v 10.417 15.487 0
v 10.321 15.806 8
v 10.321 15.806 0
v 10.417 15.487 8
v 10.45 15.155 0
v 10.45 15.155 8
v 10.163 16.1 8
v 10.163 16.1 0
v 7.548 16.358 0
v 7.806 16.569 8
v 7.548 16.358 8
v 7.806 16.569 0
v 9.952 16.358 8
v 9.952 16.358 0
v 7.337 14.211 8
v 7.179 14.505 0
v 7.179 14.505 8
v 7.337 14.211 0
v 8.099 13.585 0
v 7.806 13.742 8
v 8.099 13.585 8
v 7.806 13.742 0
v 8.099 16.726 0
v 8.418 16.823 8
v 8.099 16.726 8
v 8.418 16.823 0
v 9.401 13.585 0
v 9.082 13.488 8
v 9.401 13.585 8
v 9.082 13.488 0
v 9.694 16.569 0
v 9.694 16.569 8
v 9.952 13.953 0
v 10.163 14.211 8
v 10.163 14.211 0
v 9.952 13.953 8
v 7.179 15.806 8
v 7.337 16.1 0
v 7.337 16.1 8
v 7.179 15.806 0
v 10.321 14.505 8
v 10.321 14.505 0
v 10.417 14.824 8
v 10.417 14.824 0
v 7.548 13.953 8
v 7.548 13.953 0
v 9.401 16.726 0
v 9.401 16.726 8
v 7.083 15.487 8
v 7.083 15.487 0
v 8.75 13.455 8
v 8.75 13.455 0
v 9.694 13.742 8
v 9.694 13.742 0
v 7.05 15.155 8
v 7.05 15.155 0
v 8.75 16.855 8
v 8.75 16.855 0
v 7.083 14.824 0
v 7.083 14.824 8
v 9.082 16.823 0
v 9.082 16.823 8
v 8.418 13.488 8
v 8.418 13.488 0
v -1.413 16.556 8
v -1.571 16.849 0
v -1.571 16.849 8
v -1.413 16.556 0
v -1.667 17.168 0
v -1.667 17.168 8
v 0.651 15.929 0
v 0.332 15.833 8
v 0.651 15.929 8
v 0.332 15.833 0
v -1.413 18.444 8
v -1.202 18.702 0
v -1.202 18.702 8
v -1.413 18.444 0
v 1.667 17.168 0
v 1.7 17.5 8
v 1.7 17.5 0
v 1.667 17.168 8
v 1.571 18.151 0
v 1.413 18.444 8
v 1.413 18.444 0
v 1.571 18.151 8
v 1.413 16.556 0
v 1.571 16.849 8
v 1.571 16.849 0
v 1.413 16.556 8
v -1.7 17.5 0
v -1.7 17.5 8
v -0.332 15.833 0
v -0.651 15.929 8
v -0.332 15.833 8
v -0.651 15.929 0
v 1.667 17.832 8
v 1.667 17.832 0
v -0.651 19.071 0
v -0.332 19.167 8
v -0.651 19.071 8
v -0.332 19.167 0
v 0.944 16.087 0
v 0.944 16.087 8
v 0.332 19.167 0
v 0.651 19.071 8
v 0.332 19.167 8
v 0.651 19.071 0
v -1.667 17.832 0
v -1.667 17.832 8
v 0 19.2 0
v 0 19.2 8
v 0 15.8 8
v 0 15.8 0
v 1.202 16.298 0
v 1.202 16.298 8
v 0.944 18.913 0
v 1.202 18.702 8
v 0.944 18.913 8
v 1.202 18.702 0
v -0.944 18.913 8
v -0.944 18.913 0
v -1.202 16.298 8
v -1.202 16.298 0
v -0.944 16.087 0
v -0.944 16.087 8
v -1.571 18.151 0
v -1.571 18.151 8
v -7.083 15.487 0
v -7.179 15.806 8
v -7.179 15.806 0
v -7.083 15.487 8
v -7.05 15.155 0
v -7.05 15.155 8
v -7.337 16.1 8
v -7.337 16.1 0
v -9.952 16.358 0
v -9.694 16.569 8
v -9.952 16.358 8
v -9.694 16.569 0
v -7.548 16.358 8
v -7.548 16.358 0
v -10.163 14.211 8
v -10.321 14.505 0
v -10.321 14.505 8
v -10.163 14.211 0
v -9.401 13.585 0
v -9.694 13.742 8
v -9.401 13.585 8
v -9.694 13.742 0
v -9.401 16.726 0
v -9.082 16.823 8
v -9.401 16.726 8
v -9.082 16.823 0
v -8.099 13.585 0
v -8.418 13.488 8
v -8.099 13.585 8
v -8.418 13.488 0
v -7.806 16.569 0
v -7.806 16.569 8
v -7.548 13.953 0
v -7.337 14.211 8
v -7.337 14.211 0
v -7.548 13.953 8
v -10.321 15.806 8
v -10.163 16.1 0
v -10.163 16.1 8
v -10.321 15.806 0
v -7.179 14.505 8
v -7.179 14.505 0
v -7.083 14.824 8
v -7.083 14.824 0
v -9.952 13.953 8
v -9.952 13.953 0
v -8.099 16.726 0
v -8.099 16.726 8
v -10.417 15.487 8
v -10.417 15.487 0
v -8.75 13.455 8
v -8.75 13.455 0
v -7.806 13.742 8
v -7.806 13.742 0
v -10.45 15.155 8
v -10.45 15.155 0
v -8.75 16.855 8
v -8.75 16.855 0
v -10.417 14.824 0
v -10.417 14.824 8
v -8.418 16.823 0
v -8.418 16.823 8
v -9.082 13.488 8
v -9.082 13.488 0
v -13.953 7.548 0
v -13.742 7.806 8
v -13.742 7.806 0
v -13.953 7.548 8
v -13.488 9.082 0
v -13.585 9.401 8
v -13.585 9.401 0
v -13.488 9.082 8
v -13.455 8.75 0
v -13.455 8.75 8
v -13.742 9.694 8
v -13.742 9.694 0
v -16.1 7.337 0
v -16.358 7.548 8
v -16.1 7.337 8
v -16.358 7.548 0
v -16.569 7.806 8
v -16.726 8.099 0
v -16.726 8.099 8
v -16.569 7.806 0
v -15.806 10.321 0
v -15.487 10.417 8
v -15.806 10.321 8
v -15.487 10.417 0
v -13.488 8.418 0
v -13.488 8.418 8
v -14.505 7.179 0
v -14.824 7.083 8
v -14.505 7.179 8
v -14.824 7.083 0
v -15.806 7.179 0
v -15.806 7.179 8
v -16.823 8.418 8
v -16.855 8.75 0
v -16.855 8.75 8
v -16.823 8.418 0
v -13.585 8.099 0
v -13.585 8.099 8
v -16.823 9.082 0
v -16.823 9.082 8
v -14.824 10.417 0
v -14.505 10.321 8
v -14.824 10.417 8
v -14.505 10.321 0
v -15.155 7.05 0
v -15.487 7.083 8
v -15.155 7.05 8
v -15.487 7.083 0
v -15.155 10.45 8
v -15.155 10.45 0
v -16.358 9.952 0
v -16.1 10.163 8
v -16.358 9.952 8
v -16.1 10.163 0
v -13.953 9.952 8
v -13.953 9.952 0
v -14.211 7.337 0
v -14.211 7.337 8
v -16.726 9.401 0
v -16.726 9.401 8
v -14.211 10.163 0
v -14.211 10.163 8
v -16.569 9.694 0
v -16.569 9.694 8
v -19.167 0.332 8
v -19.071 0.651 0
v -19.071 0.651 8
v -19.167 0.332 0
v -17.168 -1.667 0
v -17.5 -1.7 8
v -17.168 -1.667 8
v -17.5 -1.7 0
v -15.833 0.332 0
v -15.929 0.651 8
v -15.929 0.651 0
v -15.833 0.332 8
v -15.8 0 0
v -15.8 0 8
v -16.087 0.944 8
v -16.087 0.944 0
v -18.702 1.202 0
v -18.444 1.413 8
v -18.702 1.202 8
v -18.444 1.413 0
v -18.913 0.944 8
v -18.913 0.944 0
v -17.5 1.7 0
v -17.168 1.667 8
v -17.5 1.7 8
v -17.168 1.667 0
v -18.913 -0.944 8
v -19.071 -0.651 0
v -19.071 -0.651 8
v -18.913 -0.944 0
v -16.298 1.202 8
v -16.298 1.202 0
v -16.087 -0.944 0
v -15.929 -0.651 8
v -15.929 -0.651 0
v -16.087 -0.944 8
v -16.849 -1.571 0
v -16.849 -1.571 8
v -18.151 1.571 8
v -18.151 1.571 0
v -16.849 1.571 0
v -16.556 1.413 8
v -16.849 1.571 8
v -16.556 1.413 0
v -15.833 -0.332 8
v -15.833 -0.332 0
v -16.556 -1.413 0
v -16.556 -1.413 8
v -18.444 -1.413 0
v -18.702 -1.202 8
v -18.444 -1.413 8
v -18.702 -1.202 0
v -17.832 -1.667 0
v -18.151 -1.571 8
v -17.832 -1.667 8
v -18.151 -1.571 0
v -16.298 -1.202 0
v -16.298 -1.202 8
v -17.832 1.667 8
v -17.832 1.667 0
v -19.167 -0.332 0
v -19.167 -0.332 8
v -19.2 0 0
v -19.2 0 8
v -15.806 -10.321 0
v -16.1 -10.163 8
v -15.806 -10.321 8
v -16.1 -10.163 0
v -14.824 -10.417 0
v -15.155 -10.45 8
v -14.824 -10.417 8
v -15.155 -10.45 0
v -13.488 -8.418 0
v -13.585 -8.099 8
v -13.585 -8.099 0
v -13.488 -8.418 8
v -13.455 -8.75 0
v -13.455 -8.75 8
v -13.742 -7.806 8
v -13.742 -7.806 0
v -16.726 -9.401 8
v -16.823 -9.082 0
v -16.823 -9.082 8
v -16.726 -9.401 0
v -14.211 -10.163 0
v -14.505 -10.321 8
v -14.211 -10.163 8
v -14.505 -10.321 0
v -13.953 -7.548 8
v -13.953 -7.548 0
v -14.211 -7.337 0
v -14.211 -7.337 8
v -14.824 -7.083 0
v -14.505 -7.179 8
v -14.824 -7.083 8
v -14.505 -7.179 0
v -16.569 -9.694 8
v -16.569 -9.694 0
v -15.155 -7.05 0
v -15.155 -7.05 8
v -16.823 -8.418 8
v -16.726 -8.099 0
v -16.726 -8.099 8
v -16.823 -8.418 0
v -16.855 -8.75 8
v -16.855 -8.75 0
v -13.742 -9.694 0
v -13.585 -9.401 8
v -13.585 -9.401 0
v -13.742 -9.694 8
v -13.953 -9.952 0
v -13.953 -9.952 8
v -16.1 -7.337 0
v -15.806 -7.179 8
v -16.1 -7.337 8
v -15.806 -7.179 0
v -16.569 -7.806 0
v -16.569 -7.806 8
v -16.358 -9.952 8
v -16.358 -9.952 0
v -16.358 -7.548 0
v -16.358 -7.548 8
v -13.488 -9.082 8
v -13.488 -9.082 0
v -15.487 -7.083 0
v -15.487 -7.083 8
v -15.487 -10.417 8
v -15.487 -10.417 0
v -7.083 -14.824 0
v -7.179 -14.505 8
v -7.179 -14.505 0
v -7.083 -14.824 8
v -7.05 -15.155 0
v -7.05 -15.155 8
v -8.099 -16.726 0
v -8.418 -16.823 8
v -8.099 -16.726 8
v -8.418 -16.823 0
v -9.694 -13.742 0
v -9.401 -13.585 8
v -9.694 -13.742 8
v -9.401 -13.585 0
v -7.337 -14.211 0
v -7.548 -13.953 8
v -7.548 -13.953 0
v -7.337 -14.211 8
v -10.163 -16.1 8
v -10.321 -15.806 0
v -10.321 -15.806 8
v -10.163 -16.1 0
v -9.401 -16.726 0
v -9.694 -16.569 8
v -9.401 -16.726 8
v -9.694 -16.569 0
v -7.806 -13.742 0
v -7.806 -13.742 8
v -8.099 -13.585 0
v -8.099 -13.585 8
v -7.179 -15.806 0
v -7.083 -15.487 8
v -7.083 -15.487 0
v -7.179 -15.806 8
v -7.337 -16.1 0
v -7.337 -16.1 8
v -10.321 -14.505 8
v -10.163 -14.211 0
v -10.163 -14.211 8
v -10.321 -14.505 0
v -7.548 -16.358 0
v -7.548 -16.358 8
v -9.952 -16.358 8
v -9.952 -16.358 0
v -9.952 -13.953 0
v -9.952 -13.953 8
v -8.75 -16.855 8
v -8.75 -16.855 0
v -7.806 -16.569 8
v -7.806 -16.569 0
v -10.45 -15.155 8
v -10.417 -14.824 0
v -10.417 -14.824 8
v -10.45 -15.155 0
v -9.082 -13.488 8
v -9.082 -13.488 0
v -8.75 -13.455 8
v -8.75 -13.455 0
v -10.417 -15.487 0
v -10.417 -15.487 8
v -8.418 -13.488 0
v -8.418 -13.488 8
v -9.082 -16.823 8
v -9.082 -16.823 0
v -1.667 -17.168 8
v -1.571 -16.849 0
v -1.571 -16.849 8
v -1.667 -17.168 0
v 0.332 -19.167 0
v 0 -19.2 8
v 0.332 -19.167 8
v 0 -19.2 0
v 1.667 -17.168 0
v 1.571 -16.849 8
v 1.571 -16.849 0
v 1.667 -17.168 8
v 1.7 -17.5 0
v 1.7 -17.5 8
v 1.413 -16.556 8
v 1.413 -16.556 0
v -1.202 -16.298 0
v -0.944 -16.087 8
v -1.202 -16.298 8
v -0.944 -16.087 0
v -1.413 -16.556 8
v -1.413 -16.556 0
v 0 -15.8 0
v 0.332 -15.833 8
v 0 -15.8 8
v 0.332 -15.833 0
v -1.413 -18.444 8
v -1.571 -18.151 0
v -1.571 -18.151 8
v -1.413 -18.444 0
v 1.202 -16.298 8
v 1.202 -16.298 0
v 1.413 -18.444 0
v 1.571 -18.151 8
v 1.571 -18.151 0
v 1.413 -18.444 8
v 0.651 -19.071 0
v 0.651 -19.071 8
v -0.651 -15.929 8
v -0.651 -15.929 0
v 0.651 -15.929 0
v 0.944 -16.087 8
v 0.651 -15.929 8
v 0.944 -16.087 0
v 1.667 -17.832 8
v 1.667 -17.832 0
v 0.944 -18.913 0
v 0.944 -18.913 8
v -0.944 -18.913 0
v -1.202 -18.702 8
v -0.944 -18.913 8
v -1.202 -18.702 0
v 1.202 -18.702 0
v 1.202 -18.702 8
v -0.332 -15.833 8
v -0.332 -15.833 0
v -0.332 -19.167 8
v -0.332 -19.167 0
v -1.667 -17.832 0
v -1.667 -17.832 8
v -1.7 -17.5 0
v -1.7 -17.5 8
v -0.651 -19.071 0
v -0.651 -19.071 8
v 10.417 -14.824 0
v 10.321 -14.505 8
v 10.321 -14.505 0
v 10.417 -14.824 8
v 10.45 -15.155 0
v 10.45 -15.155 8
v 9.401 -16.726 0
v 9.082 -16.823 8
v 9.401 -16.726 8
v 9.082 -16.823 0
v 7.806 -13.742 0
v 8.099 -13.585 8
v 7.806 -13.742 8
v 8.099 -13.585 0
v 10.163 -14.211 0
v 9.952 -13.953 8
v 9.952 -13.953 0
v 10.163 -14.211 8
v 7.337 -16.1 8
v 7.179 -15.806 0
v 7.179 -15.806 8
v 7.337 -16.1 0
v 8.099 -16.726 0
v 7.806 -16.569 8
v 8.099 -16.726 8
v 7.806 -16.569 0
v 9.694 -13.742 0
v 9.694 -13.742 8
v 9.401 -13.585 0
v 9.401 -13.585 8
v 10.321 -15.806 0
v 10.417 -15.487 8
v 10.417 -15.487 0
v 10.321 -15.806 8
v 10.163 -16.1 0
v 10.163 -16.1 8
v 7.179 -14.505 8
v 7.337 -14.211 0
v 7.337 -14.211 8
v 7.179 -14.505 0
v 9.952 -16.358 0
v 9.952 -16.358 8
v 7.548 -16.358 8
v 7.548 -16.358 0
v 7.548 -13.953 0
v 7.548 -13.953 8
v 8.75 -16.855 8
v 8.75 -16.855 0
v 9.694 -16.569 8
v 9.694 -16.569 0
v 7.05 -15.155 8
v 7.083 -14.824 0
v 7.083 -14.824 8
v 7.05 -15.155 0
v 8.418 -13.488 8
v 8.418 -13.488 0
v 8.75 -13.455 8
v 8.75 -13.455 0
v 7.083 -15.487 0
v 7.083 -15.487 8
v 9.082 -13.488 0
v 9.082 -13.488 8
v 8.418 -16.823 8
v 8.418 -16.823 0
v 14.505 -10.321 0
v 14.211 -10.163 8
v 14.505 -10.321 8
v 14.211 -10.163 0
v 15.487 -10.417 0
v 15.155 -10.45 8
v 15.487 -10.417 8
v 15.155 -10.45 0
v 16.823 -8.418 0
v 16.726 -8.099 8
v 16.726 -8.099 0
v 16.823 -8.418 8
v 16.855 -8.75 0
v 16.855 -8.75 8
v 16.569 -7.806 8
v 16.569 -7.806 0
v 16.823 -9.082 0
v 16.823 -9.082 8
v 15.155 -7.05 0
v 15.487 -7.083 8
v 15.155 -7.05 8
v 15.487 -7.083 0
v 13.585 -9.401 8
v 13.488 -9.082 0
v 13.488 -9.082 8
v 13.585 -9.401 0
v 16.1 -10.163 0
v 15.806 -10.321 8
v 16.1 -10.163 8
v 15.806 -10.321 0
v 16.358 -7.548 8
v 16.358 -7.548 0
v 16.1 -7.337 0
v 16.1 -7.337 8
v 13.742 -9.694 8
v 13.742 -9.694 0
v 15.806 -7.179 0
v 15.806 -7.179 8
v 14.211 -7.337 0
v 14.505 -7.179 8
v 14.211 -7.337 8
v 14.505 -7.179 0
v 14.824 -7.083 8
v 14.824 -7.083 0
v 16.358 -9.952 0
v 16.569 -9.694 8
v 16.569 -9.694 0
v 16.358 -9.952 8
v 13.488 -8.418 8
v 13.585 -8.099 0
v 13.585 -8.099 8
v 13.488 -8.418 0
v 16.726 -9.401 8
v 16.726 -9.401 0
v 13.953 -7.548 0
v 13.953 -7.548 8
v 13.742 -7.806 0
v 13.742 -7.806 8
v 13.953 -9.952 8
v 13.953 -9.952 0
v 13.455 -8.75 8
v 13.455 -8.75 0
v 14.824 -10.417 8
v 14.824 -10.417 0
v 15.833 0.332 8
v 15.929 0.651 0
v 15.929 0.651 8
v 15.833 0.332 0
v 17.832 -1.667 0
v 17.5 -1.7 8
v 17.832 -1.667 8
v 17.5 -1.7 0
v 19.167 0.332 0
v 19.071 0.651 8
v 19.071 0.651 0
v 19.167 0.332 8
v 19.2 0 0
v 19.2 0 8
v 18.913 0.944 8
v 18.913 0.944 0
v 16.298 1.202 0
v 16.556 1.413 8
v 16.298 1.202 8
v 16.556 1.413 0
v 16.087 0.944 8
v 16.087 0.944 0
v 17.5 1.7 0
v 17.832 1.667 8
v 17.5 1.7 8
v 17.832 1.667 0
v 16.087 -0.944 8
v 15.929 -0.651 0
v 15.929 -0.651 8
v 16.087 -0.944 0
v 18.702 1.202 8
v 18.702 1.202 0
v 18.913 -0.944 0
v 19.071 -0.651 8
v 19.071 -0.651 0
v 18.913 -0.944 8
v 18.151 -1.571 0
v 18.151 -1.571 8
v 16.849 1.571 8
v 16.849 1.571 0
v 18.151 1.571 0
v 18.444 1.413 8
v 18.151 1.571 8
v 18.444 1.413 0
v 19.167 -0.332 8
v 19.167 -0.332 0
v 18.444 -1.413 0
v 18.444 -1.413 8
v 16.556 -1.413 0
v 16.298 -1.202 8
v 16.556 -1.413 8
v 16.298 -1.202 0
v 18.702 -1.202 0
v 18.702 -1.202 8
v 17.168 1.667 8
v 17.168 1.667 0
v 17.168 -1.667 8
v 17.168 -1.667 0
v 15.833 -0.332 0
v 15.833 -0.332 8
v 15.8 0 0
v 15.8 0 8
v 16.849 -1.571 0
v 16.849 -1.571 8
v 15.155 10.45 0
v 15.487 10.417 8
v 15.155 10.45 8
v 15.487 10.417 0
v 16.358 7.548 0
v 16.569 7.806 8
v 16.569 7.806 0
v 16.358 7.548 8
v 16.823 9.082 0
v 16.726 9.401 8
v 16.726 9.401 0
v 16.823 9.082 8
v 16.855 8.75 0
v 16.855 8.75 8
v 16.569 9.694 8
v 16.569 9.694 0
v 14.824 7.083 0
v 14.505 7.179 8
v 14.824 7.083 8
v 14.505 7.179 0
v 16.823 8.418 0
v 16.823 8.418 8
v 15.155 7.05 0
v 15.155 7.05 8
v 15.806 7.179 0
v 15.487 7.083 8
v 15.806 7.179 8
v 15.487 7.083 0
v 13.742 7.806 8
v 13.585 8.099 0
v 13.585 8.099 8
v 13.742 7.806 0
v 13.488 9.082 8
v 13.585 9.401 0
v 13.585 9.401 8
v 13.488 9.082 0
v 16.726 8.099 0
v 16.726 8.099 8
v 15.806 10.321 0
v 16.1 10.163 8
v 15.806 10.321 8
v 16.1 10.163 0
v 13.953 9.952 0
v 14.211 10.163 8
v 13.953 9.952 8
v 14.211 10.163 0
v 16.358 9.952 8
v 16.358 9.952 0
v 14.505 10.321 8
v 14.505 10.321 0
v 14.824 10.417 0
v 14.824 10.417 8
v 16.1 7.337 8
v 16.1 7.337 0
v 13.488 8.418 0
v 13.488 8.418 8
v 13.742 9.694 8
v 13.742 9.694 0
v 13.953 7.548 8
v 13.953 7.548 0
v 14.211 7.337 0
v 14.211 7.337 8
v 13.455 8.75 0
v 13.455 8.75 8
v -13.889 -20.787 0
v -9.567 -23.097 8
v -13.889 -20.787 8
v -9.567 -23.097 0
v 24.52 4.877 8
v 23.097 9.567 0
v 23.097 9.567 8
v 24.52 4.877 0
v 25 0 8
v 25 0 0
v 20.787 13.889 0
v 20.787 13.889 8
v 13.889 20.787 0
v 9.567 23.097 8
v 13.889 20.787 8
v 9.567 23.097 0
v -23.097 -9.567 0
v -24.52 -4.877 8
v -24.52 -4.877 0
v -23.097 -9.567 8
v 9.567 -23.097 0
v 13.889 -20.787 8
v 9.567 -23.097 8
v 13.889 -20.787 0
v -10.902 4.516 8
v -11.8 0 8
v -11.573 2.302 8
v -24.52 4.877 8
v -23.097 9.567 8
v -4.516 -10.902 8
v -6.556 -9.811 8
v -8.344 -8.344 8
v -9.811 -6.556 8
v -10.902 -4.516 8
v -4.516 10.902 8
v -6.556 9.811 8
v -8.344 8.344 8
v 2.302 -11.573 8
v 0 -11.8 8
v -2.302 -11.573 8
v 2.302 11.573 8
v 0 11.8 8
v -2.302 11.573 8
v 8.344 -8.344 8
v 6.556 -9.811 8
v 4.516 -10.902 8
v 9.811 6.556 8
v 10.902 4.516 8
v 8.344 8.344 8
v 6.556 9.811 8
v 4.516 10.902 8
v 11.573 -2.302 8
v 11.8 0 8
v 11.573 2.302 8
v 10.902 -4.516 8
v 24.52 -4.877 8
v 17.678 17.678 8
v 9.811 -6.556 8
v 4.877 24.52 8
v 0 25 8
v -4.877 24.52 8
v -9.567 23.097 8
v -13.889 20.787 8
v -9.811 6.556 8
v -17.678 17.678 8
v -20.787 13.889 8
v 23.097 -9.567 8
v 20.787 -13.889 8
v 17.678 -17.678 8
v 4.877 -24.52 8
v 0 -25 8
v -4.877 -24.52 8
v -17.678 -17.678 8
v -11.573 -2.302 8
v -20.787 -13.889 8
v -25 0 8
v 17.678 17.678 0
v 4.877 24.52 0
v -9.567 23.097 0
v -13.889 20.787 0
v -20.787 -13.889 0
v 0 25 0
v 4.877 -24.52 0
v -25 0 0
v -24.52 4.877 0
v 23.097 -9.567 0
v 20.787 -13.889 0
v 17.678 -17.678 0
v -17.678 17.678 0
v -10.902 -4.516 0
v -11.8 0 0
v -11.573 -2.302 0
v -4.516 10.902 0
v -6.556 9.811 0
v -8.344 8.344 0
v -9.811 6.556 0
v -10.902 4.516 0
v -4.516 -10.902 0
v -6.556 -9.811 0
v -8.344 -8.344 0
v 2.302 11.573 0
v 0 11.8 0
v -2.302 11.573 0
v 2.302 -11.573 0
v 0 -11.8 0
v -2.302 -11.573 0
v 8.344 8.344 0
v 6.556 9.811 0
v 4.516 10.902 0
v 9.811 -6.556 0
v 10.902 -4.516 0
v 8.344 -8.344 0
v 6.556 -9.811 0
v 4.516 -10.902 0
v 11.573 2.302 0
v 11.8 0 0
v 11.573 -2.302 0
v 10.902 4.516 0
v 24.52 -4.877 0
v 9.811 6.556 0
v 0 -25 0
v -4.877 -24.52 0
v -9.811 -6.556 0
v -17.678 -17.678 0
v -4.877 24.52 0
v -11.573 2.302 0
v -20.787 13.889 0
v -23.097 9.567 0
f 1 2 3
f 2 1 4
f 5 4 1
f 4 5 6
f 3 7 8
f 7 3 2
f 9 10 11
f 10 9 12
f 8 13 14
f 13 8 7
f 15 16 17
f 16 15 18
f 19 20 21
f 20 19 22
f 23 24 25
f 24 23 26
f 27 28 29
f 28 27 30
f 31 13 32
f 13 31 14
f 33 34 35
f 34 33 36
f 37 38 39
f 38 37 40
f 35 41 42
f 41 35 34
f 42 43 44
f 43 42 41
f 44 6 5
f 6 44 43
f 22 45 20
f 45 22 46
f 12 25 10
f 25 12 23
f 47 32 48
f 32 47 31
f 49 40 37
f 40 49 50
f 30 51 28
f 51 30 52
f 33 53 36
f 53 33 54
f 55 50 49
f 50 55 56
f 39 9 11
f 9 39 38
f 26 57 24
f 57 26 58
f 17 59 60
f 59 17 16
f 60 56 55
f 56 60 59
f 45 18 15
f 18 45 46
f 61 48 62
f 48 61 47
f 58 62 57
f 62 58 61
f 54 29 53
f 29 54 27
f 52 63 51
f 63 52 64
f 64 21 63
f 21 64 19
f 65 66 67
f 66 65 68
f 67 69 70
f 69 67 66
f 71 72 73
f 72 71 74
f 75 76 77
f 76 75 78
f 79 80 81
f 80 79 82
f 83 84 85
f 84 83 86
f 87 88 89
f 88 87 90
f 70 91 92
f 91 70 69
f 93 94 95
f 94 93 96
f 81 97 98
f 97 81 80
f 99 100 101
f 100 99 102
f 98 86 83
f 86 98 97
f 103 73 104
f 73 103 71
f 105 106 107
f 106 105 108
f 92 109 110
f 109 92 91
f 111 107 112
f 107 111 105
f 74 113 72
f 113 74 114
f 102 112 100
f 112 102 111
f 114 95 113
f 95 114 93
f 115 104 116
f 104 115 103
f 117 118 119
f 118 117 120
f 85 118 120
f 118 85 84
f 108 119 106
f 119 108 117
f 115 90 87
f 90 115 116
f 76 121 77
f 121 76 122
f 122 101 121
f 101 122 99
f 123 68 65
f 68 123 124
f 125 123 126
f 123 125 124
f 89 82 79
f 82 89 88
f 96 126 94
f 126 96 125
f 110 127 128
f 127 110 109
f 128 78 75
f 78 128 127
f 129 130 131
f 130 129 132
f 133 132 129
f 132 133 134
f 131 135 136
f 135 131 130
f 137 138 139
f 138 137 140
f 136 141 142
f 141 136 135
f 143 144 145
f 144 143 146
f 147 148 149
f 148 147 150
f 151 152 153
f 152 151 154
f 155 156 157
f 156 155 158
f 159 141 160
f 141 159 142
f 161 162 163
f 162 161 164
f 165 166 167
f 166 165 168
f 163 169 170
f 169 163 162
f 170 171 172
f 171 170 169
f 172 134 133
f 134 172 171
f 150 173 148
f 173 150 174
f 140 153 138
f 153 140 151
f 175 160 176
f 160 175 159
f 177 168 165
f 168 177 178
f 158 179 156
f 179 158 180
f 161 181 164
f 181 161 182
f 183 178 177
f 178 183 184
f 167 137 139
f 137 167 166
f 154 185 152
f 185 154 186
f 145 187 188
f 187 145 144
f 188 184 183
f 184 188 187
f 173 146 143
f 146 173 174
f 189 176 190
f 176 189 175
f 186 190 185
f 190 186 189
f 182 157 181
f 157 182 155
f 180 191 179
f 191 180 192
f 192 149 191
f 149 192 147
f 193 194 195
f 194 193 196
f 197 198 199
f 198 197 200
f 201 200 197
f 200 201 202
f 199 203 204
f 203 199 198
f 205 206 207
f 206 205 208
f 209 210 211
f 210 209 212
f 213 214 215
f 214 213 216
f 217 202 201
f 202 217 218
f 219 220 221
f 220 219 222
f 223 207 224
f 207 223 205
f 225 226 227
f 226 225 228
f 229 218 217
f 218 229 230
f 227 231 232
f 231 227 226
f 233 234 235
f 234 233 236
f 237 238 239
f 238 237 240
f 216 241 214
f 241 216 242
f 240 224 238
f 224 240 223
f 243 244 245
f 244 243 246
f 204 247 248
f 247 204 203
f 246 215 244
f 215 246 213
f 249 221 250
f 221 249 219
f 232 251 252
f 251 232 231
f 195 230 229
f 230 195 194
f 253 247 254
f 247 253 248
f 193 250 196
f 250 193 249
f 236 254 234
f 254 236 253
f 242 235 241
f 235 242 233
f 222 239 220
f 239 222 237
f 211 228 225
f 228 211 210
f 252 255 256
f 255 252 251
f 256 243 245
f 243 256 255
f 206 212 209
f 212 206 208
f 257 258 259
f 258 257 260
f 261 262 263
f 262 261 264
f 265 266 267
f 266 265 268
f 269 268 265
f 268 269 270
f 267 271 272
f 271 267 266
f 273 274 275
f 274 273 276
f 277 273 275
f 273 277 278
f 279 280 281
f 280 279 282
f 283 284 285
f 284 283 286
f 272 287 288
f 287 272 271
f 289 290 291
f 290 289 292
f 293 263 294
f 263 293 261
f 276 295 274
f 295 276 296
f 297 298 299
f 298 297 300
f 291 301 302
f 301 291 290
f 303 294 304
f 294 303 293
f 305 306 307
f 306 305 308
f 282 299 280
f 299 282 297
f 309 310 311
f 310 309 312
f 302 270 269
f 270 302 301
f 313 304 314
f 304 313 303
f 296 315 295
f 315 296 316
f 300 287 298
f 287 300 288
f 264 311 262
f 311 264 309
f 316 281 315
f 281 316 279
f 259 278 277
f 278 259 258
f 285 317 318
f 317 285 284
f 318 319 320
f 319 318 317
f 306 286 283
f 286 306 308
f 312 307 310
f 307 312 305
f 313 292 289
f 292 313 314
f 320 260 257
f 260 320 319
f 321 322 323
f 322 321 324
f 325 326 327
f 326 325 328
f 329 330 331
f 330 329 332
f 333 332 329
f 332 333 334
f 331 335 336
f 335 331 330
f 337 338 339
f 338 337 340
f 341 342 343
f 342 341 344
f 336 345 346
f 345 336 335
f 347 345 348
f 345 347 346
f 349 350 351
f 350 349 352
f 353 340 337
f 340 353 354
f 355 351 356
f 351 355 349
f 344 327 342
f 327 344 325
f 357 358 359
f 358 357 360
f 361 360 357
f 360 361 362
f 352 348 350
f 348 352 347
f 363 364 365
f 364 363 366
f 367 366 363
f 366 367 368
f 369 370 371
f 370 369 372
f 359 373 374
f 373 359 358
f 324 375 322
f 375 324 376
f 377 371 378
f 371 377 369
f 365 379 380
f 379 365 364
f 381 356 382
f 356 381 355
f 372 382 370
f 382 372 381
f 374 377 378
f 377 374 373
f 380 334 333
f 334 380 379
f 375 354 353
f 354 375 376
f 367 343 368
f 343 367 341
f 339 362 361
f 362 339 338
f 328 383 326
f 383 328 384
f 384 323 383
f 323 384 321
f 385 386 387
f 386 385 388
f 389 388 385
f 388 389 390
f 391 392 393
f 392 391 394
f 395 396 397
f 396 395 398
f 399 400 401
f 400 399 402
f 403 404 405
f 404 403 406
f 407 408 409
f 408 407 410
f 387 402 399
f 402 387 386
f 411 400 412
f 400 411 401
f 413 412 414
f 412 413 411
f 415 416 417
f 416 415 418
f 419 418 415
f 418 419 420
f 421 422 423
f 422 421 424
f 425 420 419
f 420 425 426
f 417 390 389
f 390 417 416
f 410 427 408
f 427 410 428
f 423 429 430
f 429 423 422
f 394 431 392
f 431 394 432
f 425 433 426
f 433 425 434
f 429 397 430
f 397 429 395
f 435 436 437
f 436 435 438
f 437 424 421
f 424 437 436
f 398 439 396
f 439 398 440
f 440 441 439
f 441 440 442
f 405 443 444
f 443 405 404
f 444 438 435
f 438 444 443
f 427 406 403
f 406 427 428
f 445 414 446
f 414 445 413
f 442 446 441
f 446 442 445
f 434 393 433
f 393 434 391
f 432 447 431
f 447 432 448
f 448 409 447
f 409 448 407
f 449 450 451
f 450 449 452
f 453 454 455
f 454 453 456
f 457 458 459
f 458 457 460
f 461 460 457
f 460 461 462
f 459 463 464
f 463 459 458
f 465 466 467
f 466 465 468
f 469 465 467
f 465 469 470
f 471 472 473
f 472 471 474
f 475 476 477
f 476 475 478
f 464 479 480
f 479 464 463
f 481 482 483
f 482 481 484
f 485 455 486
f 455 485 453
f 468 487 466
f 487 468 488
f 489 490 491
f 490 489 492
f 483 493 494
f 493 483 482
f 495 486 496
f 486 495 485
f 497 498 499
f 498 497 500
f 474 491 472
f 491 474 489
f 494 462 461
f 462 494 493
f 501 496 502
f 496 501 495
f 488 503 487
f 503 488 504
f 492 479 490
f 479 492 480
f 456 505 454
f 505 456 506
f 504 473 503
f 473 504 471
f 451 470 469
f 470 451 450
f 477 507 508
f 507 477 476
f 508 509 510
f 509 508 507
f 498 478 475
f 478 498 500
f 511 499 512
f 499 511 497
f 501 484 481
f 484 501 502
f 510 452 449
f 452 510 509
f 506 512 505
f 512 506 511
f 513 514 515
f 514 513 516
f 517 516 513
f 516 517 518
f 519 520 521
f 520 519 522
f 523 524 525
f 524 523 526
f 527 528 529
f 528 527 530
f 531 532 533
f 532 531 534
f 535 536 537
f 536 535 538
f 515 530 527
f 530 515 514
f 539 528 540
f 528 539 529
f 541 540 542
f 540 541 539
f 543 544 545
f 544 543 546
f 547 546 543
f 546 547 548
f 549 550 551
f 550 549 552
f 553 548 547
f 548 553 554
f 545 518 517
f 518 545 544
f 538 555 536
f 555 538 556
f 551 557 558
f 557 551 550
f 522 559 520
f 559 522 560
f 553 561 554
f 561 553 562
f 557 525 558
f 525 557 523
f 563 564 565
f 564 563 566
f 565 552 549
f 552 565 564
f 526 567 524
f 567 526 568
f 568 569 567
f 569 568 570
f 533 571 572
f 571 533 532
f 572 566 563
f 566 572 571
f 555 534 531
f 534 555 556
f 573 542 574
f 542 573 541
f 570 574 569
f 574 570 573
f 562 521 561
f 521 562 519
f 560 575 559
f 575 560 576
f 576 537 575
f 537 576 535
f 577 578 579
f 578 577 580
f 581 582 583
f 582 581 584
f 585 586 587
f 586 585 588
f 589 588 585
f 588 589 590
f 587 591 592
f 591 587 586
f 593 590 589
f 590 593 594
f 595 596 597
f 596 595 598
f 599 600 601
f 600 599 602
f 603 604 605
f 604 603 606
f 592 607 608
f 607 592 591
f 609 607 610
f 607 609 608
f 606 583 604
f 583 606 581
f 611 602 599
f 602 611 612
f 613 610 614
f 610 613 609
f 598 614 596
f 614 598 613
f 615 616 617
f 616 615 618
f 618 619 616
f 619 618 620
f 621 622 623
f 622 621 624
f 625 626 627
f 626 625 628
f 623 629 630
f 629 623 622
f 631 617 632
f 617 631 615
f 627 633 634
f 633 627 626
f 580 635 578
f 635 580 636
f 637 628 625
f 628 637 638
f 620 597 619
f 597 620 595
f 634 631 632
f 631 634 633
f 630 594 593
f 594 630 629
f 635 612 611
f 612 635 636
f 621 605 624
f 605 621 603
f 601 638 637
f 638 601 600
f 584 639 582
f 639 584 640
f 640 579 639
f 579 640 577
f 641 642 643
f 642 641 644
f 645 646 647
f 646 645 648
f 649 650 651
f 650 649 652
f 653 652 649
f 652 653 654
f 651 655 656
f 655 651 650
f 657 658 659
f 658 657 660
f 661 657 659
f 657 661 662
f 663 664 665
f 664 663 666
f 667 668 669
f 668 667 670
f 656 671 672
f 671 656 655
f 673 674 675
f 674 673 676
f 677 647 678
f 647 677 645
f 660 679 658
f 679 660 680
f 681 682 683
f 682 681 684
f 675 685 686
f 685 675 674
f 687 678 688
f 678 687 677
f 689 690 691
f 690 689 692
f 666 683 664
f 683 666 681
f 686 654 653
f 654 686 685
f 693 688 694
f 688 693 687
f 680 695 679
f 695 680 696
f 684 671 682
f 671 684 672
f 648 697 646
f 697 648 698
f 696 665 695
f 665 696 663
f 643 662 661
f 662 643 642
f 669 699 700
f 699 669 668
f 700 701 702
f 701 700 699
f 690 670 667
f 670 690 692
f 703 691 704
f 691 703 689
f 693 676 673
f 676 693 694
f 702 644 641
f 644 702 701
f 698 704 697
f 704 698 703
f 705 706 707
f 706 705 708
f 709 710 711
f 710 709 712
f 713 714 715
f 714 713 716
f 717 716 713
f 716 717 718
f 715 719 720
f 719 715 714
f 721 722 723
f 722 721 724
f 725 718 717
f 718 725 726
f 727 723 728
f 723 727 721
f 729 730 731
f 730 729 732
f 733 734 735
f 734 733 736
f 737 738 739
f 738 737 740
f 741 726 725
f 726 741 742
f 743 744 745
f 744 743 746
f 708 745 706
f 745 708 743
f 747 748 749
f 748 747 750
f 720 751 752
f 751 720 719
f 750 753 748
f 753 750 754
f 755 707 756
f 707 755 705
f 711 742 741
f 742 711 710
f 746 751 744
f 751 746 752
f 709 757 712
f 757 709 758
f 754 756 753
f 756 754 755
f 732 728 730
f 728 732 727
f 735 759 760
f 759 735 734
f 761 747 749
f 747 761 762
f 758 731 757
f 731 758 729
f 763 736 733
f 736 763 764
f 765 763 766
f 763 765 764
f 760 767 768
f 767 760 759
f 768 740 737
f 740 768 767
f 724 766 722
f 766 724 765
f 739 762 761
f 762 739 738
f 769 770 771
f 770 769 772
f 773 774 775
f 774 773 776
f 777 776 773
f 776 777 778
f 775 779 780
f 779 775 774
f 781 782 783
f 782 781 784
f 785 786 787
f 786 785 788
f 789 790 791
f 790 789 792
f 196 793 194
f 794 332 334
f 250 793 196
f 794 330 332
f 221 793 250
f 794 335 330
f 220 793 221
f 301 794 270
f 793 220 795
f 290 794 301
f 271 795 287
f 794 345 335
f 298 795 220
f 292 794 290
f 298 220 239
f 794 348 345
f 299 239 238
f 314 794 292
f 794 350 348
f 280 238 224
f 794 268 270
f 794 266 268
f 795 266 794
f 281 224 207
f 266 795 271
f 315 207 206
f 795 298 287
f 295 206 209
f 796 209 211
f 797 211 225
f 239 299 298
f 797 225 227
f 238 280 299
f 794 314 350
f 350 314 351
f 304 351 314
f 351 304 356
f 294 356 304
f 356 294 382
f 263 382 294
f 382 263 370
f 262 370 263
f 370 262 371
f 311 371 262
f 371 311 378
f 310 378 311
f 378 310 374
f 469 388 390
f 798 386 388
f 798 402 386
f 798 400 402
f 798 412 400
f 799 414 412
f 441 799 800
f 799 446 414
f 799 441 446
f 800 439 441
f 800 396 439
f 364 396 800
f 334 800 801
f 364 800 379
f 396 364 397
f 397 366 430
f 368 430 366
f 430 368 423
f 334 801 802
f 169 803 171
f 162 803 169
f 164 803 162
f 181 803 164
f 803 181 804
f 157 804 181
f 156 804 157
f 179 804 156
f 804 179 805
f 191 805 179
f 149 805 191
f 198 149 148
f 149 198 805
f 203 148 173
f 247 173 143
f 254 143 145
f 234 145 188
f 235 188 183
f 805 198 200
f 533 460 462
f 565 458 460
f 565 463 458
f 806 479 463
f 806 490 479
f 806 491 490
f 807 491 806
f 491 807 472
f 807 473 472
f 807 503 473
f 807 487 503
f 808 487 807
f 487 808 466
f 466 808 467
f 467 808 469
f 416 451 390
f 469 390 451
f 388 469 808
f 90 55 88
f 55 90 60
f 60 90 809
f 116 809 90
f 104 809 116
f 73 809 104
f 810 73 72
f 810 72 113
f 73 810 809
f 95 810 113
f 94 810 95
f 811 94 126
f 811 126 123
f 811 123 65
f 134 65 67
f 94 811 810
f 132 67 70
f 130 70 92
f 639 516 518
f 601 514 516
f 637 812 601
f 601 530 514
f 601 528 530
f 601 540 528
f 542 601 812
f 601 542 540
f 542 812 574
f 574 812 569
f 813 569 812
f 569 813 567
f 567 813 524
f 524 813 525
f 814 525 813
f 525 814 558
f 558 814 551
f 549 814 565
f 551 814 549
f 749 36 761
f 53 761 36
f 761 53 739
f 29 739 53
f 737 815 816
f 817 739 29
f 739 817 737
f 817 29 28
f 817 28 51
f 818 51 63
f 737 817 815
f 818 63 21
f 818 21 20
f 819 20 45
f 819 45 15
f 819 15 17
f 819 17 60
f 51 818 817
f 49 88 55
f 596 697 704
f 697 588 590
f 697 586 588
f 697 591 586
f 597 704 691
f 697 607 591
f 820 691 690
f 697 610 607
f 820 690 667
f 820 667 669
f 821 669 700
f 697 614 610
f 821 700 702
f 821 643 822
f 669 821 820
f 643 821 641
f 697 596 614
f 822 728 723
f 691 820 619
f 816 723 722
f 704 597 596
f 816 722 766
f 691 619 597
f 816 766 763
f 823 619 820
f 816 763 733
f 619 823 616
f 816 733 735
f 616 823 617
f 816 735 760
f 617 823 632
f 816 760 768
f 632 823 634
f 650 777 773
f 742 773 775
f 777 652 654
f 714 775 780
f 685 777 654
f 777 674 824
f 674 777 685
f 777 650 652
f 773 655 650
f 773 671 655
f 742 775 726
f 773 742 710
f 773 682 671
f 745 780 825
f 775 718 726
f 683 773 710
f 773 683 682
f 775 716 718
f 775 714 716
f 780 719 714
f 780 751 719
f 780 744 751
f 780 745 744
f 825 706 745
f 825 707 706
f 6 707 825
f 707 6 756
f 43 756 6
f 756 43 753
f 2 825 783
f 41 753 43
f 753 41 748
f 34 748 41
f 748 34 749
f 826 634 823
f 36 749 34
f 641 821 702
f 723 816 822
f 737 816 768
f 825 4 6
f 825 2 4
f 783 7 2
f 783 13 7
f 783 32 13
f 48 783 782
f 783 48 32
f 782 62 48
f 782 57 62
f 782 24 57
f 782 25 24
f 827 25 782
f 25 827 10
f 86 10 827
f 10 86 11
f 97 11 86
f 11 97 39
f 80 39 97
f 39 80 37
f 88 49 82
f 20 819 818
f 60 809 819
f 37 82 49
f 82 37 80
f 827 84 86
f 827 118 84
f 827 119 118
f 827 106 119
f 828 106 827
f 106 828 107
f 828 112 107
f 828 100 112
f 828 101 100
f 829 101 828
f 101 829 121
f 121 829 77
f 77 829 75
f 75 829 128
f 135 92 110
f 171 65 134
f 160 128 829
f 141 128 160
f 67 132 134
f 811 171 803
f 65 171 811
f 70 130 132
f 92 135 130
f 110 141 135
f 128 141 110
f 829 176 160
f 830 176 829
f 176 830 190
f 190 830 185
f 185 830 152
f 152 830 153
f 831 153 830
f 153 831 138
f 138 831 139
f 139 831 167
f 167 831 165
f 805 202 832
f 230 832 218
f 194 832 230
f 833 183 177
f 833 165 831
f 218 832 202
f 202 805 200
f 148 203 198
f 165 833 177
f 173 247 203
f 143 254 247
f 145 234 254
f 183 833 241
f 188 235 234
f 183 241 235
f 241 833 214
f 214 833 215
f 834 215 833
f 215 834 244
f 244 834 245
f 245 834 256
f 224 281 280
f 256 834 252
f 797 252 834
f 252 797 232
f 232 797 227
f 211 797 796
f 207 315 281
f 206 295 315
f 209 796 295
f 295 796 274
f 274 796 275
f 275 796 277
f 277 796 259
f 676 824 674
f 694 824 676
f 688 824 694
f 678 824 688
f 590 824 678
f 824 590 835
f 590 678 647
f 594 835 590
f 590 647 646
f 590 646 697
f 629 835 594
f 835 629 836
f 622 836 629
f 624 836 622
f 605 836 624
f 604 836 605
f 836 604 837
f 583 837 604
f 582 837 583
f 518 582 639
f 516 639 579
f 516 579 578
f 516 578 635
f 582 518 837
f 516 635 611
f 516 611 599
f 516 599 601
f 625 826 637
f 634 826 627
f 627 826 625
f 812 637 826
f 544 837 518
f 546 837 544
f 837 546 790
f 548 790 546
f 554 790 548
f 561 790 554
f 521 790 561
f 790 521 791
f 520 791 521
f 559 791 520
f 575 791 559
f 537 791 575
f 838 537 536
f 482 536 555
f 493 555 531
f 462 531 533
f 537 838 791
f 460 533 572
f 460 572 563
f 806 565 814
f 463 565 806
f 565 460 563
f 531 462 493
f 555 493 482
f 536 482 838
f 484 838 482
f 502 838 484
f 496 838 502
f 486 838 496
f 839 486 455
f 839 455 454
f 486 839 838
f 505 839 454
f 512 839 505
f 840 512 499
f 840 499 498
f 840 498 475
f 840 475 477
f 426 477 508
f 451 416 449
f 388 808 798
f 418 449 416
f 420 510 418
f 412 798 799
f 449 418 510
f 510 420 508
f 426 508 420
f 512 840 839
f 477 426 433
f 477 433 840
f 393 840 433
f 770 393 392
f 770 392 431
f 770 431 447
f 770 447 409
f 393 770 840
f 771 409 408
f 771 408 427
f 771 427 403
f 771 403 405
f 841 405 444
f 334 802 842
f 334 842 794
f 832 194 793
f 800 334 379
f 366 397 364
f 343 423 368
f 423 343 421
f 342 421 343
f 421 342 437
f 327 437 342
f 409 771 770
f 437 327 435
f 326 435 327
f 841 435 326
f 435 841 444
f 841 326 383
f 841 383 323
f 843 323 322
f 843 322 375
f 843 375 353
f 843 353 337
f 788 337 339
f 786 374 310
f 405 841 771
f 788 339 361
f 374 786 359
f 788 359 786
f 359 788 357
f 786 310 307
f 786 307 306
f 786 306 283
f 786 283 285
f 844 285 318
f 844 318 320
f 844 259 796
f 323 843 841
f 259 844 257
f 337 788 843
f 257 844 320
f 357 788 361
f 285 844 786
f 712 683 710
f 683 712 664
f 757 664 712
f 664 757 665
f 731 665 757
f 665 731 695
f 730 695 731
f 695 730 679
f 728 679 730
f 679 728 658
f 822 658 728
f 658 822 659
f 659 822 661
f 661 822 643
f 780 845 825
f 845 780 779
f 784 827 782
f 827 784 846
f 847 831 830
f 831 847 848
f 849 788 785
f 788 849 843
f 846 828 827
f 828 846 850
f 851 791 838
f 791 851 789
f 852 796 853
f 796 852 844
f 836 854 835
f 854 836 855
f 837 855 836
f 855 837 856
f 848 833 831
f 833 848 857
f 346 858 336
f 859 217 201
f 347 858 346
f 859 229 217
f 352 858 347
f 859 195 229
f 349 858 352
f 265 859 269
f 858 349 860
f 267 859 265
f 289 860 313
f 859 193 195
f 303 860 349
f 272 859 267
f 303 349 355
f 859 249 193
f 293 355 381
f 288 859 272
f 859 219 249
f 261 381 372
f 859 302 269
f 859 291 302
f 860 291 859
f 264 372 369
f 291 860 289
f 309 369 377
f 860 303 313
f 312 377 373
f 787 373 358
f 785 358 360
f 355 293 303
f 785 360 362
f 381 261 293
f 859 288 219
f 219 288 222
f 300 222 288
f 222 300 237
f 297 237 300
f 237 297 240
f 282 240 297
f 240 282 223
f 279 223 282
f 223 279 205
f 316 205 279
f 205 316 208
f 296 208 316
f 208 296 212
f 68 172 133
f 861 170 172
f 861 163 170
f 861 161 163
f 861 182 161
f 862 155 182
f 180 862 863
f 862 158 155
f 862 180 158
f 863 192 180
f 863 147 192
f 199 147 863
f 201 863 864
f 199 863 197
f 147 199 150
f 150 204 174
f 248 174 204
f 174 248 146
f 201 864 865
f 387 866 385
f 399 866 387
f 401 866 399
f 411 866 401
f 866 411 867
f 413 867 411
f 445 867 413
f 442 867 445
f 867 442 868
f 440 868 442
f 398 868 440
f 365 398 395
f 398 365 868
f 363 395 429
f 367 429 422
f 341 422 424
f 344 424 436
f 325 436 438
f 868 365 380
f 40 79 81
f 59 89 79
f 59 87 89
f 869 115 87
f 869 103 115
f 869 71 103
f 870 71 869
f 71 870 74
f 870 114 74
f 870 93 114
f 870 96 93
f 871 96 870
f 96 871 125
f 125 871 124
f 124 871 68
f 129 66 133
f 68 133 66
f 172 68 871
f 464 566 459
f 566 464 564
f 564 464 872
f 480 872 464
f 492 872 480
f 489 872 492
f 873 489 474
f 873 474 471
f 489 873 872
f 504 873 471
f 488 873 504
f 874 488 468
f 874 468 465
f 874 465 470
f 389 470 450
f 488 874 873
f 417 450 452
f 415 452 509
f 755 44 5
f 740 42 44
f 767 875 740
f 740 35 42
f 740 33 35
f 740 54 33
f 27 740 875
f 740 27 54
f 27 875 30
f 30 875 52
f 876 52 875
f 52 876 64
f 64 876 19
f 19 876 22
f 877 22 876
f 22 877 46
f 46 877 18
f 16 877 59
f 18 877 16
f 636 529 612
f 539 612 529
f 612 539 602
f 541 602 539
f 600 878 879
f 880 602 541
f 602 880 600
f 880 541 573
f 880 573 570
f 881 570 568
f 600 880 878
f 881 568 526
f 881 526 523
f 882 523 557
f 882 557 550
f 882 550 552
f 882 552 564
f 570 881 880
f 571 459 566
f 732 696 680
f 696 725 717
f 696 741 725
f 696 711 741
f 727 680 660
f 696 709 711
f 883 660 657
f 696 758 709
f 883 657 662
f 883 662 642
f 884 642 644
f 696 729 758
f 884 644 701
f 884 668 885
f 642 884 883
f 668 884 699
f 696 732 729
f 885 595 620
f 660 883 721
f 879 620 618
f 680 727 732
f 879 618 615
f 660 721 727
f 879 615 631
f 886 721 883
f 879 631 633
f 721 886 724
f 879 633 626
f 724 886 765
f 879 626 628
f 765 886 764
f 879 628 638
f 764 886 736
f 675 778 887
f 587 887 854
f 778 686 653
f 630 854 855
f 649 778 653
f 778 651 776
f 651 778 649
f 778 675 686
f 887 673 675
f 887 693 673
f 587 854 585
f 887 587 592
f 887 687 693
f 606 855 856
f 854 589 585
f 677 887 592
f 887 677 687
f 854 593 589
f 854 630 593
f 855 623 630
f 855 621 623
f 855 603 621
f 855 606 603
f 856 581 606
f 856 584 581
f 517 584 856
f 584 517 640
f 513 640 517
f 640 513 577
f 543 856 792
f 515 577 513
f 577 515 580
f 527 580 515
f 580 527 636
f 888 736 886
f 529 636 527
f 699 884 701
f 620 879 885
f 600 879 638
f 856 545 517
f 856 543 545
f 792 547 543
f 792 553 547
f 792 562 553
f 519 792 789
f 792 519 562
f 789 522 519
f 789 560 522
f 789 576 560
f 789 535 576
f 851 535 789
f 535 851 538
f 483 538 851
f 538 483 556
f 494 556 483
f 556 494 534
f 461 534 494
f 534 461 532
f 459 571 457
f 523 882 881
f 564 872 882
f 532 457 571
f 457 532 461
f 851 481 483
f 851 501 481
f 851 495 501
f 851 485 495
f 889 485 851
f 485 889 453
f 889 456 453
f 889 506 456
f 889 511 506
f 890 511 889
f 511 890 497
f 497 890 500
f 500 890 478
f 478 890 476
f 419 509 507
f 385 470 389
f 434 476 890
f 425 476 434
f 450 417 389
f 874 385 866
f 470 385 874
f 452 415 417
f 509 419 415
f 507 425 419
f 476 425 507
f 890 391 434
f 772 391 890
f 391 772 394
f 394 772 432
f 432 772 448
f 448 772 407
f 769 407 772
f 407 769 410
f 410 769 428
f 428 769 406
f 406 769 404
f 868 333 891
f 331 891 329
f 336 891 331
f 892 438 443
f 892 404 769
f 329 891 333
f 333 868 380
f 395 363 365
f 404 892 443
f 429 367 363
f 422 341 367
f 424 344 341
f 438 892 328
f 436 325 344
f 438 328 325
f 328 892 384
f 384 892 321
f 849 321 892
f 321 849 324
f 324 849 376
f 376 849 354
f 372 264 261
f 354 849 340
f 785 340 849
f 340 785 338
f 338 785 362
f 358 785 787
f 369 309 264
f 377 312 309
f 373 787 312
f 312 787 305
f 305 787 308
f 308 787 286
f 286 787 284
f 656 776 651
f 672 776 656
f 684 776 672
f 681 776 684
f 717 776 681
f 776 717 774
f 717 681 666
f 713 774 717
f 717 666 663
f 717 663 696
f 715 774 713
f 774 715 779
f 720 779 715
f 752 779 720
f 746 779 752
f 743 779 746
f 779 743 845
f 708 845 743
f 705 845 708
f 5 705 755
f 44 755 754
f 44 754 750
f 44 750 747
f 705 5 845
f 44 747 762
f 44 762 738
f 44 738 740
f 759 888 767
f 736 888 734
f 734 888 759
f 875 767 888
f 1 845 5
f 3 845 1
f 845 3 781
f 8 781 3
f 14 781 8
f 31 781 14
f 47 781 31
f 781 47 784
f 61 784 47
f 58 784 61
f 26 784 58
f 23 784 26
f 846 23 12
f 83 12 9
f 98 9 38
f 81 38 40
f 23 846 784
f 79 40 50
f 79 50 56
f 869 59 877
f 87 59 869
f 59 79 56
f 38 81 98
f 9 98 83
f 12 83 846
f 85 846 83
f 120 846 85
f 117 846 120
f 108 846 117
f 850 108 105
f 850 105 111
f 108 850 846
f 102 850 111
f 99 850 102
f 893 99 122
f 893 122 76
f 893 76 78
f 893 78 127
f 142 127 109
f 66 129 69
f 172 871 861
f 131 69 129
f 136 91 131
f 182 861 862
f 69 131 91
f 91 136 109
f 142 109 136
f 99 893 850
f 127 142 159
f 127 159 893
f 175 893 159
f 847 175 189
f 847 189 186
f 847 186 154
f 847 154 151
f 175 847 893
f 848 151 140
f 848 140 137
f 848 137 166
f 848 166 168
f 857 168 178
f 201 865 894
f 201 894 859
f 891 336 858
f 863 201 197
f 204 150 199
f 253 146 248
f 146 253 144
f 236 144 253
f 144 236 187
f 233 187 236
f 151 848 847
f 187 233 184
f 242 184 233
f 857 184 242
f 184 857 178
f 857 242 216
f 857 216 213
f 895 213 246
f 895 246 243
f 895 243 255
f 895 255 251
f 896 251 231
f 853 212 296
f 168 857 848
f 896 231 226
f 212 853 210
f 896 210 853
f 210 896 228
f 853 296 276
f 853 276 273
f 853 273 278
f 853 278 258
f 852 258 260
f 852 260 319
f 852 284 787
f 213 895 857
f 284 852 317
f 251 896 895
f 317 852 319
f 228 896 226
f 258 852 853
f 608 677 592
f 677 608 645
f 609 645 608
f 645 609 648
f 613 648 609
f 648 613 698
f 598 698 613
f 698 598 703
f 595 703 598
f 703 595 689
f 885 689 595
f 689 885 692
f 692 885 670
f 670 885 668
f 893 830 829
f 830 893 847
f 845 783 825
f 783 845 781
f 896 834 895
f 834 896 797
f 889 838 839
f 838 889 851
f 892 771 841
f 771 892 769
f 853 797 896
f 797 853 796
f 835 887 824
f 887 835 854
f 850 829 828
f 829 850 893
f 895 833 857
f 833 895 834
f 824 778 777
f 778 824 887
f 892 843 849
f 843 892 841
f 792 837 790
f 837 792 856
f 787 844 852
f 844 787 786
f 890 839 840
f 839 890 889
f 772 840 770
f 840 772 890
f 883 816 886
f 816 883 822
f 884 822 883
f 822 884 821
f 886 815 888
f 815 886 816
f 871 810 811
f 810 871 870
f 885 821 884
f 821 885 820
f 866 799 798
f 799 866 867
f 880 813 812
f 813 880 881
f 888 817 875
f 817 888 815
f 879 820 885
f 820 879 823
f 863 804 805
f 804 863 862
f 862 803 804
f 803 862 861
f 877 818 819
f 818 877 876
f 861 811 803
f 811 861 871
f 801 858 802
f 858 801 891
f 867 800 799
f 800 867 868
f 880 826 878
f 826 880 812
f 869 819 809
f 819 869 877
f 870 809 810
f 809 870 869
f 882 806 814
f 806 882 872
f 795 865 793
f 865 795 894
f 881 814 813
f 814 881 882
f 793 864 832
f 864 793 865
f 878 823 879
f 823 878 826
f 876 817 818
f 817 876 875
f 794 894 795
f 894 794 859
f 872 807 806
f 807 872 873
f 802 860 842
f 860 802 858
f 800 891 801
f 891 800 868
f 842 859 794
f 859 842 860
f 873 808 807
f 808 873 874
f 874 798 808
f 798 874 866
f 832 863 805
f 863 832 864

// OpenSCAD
$fn = 32;

// ----------------------------------------------------------------------
// Flange Ø50 x 8
// 12 holes on a Ø35 bolt circle, bolted joints
// ----------------------------------------------------------------------

// --- parameters (mm) ---
flange_d = 50;   // outside diameter of the flange
thickness = 8;   // flange thickness
holes = 12;      // number of bolt holes
pcd = 35;        // bolt circle diameter
start_deg = 60;  // angle of the first hole, from +X
hole_d = 3.4;    // bolt hole diameter
bore_d = 23.6;   // central through bore
hub_d = 35.6;    // hub outside diameter
hub_h = 0;       // hub height above the flange face (0 = no hub)

// --- derived feature positions (mm) ---
height = thickness + hub_h;  // = 8   overall height of the part
pcd_r = pcd / 2;             // = 17.5   bolt circle radius
hole_step = 360 / holes;     // = 30   angular pitch
feature_centers = [
  [pcd_r * cos(start_deg + 0 * hole_step), pcd_r * sin(start_deg + 0 * hole_step)],
  [pcd_r * cos(start_deg + 1 * hole_step), pcd_r * sin(start_deg + 1 * hole_step)],
  [pcd_r * cos(start_deg + 2 * hole_step), pcd_r * sin(start_deg + 2 * hole_step)],
  [pcd_r * cos(start_deg + 3 * hole_step), pcd_r * sin(start_deg + 3 * hole_step)],
  [pcd_r * cos(start_deg + 4 * hole_step), pcd_r * sin(start_deg + 4 * hole_step)],
  [pcd_r * cos(start_deg + 5 * hole_step), pcd_r * sin(start_deg + 5 * hole_step)],
  [pcd_r * cos(start_deg + 6 * hole_step), pcd_r * sin(start_deg + 6 * hole_step)],
  [pcd_r * cos(start_deg + 7 * hole_step), pcd_r * sin(start_deg + 7 * hole_step)],
  [pcd_r * cos(start_deg + 8 * hole_step), pcd_r * sin(start_deg + 8 * hole_step)],
  [pcd_r * cos(start_deg + 9 * hole_step), pcd_r * sin(start_deg + 9 * hole_step)],
  [pcd_r * cos(start_deg + 10 * hole_step), pcd_r * sin(start_deg + 10 * hole_step)],
  [pcd_r * cos(start_deg + 11 * hole_step), pcd_r * sin(start_deg + 11 * hole_step)]
];   // bolt hole centres on the pitch circle

// flange disc, every hole and the bore cut straight through
difference() {
  union() {
    cylinder(d = flange_d, h = thickness);
  }
  translate([0, 0, -1]) cylinder(d = bore_d, h = height + 2);  // bore, through
  for (centre = feature_centers)
    translate([centre[0], centre[1], -1]) cylinder(d = hole_d, h = thickness + 2);
}
